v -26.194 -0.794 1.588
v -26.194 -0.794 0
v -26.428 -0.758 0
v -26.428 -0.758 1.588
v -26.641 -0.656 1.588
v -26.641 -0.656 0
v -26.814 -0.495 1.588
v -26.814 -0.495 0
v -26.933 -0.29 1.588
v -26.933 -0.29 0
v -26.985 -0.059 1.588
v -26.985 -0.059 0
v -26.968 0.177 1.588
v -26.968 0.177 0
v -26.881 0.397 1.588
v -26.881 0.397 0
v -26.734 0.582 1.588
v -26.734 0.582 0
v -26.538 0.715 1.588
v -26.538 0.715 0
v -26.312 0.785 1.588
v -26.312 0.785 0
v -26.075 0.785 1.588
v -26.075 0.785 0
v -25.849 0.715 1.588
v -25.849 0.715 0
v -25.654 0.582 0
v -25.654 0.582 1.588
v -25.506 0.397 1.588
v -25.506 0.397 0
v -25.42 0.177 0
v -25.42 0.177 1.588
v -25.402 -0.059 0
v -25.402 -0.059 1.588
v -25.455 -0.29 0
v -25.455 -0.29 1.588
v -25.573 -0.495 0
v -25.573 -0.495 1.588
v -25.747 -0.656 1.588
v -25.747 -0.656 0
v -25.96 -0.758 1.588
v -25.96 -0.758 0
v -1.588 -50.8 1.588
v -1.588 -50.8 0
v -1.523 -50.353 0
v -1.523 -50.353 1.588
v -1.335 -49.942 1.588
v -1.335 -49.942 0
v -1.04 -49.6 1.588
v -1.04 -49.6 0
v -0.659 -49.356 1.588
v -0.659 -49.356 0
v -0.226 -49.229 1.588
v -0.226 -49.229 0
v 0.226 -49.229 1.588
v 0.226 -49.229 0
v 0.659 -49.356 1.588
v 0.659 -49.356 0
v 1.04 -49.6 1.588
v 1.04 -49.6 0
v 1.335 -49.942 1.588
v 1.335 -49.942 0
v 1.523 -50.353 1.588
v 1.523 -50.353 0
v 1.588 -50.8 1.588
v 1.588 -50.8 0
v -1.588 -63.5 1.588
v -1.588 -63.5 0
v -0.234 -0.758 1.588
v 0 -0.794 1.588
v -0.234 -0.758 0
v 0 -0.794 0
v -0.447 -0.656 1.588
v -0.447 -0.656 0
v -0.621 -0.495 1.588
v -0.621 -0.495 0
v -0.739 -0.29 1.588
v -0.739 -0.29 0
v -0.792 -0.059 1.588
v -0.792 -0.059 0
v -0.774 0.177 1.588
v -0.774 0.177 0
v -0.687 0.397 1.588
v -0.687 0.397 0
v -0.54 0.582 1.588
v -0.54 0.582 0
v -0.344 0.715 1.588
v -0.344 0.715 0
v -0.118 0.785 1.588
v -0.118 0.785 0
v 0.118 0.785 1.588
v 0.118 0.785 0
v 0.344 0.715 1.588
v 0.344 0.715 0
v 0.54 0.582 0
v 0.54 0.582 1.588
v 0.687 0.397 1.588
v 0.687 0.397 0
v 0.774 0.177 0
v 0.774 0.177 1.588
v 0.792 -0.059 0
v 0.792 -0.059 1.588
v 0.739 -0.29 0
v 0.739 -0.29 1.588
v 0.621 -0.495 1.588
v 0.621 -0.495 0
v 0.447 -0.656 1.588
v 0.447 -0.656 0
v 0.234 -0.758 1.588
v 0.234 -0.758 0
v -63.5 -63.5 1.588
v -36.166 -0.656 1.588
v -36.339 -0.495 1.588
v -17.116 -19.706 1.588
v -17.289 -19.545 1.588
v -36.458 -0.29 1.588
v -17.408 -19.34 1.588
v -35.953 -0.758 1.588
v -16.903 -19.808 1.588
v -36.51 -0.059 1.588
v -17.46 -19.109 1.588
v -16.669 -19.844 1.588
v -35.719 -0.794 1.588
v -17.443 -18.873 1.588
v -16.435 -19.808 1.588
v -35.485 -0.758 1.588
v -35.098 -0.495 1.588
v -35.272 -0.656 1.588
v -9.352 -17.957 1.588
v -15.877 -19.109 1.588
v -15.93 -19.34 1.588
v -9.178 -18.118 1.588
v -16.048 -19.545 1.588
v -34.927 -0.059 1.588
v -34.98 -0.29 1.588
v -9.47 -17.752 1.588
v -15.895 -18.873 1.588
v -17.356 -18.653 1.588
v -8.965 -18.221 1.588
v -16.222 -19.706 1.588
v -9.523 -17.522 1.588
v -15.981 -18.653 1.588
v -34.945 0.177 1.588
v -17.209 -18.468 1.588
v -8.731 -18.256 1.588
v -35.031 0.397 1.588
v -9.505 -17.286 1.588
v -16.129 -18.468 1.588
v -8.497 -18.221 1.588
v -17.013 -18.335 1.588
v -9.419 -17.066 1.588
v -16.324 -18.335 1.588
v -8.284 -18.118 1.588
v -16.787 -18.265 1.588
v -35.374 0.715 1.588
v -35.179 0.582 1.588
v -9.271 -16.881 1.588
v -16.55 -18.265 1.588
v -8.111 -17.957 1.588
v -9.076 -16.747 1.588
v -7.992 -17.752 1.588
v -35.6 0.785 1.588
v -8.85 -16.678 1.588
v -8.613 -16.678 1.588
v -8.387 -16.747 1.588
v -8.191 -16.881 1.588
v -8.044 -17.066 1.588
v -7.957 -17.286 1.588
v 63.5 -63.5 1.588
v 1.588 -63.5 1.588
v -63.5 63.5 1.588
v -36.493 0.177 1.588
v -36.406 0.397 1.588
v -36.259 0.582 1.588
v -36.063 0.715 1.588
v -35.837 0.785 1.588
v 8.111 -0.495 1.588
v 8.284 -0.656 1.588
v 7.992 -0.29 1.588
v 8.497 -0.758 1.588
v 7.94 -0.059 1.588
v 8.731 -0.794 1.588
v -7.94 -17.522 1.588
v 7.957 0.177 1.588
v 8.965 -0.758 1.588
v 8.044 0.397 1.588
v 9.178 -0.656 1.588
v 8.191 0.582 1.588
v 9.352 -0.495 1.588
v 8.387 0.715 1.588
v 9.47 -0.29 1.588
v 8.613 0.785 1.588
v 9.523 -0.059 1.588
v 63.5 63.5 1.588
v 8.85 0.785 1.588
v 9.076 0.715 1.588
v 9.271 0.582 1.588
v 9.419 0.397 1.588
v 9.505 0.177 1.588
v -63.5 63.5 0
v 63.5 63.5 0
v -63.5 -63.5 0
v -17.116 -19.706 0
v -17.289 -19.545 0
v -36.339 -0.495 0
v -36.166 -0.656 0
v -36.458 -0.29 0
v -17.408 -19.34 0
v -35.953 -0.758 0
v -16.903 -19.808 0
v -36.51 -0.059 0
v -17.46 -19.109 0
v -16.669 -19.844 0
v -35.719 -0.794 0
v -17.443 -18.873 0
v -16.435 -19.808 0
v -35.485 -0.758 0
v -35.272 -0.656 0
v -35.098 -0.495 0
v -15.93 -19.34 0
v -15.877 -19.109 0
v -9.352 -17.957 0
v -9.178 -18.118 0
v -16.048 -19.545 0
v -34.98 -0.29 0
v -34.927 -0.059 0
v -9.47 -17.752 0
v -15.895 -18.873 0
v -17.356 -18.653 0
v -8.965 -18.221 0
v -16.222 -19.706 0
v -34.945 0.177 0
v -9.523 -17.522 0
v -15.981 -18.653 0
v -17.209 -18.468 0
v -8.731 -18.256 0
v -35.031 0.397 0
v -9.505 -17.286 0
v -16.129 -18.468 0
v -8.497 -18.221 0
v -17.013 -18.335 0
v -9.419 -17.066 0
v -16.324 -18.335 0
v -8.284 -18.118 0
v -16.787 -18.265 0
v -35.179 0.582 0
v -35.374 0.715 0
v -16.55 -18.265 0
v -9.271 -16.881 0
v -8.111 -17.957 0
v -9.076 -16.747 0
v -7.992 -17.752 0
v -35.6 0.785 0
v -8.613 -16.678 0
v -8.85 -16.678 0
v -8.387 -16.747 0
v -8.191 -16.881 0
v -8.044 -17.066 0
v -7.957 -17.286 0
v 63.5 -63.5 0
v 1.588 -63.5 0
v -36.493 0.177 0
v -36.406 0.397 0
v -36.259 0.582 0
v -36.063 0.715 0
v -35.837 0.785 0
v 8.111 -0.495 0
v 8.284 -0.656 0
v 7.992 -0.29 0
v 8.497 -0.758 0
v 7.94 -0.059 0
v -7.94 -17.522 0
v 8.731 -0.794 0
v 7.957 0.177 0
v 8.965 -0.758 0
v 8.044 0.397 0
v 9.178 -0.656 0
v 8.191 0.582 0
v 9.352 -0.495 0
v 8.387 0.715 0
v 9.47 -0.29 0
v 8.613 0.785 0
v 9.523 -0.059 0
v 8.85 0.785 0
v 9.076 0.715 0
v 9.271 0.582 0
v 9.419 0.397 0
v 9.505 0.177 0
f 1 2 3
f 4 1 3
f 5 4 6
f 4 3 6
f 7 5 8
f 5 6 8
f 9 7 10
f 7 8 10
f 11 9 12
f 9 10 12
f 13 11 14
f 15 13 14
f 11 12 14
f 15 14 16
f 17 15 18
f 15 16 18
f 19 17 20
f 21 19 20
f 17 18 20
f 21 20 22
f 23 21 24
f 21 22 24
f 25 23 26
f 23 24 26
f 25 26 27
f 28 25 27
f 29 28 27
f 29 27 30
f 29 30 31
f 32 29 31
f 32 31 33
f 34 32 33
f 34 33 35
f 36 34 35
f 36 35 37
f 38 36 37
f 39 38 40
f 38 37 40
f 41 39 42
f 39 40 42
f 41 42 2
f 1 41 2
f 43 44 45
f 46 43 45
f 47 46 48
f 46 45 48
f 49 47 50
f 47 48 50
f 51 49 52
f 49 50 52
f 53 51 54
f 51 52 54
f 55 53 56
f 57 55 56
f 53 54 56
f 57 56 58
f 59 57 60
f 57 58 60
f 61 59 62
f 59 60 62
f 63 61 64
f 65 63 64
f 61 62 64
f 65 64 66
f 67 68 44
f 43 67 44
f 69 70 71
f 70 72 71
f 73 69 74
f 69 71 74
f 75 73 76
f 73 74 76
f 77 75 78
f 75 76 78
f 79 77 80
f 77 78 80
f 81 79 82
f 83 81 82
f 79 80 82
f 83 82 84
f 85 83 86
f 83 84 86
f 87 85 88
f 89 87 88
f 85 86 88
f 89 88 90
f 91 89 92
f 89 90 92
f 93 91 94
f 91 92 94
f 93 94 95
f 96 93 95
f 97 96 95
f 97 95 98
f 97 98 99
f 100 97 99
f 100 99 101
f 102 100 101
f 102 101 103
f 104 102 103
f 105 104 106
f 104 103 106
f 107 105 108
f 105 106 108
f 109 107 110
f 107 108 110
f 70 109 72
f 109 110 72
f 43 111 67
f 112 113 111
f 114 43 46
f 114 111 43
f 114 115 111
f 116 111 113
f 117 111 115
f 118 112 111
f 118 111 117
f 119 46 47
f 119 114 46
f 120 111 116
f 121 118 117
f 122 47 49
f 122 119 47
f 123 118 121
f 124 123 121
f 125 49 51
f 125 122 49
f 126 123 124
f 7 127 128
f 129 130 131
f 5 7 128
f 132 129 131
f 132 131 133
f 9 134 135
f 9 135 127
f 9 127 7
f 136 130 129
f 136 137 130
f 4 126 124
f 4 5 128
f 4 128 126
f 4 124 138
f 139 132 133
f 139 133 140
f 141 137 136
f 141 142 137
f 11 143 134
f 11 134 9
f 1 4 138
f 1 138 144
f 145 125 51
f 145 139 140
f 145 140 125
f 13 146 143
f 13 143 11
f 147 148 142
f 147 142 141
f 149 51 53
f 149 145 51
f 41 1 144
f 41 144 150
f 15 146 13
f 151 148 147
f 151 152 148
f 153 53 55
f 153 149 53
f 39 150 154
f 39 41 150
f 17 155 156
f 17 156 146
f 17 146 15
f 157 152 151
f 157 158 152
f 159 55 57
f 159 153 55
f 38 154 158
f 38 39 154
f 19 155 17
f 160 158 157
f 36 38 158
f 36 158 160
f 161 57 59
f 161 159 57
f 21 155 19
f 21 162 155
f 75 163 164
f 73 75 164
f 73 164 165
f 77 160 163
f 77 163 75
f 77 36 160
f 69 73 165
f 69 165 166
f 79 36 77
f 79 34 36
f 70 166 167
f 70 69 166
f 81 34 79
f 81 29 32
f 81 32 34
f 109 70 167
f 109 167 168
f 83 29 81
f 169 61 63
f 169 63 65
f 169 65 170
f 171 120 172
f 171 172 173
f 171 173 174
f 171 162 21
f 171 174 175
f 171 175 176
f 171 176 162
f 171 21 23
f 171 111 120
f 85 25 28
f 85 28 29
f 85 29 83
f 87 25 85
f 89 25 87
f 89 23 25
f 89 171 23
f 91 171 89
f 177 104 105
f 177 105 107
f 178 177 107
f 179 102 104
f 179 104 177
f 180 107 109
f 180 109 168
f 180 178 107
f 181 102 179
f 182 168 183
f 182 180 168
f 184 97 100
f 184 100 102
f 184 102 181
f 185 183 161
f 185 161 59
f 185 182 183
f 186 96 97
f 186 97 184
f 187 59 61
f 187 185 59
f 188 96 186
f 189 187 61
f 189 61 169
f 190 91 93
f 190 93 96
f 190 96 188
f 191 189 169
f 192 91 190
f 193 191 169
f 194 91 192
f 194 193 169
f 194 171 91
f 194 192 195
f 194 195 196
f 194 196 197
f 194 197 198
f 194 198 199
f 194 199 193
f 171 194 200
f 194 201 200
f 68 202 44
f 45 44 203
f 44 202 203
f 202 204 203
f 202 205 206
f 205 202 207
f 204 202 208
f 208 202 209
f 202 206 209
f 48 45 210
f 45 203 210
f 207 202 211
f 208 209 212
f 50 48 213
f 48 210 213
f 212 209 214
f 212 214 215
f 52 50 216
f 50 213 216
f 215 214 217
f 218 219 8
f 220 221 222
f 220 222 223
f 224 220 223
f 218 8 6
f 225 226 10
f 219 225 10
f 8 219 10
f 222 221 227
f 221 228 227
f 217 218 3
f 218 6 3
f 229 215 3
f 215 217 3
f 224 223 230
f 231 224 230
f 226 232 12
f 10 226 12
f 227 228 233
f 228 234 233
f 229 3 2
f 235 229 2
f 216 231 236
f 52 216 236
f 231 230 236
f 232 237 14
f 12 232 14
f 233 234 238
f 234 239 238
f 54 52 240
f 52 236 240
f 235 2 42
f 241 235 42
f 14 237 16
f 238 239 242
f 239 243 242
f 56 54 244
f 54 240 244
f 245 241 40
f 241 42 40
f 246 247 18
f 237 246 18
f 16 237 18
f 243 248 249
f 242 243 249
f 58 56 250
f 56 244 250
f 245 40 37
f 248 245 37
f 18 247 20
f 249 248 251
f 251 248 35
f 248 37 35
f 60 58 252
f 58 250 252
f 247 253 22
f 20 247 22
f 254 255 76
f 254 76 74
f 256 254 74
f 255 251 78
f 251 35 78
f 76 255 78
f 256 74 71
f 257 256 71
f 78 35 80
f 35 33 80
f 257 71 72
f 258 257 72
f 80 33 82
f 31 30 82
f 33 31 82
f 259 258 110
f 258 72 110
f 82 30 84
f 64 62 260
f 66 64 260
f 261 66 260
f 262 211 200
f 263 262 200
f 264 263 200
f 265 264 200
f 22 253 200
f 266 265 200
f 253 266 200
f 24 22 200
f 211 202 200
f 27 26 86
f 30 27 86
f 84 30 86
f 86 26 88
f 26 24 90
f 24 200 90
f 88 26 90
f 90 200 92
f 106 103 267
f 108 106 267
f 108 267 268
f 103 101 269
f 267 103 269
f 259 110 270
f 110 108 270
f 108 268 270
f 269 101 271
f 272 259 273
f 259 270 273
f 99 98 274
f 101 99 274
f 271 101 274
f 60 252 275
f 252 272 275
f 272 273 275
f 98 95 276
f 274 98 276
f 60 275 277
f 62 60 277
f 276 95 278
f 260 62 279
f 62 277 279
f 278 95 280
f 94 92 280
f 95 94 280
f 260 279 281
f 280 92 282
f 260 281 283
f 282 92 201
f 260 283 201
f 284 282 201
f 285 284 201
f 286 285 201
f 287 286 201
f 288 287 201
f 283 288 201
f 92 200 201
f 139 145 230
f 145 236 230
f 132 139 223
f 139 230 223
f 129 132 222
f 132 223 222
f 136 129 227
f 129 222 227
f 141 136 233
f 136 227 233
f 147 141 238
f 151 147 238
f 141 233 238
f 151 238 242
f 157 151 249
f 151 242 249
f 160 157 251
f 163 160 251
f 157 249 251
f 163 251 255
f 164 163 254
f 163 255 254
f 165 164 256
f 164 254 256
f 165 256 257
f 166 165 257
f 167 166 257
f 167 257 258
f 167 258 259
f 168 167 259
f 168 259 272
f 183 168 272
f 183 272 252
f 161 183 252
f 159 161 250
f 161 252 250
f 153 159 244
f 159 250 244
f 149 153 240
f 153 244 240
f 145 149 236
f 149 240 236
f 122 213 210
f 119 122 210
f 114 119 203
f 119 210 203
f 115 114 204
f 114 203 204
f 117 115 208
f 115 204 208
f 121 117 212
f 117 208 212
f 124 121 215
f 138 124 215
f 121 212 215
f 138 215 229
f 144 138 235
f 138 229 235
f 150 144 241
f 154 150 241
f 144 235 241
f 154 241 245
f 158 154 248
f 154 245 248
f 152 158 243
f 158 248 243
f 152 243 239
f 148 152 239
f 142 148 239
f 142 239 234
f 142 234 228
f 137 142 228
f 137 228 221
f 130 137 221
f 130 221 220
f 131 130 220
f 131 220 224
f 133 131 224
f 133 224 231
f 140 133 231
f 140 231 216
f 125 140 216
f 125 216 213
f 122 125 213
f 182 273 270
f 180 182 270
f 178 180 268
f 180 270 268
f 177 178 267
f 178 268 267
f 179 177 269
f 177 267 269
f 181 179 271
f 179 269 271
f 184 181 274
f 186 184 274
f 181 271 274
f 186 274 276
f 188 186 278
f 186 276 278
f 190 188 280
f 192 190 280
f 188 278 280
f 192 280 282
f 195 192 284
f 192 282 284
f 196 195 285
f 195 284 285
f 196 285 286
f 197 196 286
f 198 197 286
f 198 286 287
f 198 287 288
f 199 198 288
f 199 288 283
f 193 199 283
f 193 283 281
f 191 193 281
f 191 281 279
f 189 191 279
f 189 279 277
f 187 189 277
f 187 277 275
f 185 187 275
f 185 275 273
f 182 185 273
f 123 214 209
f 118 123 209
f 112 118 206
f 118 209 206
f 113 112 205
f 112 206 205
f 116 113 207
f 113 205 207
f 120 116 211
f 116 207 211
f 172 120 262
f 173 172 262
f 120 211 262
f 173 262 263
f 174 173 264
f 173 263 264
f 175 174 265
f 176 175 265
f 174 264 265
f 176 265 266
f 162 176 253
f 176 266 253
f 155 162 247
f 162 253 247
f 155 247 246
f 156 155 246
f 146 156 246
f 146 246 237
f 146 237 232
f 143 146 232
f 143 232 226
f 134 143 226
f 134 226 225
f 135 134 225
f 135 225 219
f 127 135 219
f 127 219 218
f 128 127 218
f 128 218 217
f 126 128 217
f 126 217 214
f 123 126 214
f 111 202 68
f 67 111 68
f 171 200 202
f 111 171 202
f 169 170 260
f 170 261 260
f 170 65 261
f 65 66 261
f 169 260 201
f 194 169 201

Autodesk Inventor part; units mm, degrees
ref_plane "YZ Plane" through (0, 0, 0) normal (1, 0, 0) x (0, 1, 0)
ref_plane "XZ Plane" through (0, 0, 0) normal (0, 1, 0) x (-1, 0, 0)
ref_plane "XY Plane" through (0, 0, 0) normal (0, 0, 1) x (1, 0, 0)
sketch "Sketch1" plane through (0, 0, 0) normal (0, 0, 1) x (1, 0, 0)
  line L0 (-63.5, -63.5) -> (63.5, -63.5)
  line L1 (63.5, -63.5) -> (63.5, 63.5)
  line L2 (63.5, 63.5) -> (-63.5, 63.5)
  line L3 (-63.5, 63.5) -> (-63.5, -63.5)
  line L4 (-63.5, -63.5) -> (63.5, 63.5) construction
  line L5 (63.5, -63.5) -> (-63.5, 63.5) construction
  point P0 (0, 0)
  dimension "d0" = 127
  dimension "d1" = 127
extrude "Extrusion1" add sketch "Sketch1" along normal blind 1.5875
sketch "Sketch2" plane through (0, 0, 0) normal (0, 0, -1) x (-1, 0, 0)
  line L0 (0, -76.2) -> (0, -50.8) construction
  line L1 (63.5, -63.5) -> (-63.5, -63.5) projected
  line L2 (1.5875, -76.2) -> (1.5875, -50.8)
  line L3 (-1.5875, -50.8) -> (-1.5875, -76.2)
  arc A0 (-1.5875, -76.2) -> (1.5875, -76.2) centre (0, -76.2) ccw
  arc A1 (1.5875, -50.8) -> (-1.5875, -50.8) centre (0, -50.8) ccw
  point P0 (0, 0)
  point P1 (0, -63.5)
  dimension "d4" = 12.7
  dimension "d5" = 3.175
extrude "Extrusion2" cut sketch "Sketch2" against normal blind 1.5875
sketch "Sketch3" plane through (0, 0, 1.5875) normal (0, 0, 1) x (1, 0, 0)
  line L0 (-35.7187, 0) -> (2.3813, 0)
  line L1 (-16.6687, 0) -> (-16.6687, -19.05)
  line L2 (-63.5, 63.5) -> (-63.5, -63.5) projected
  line L3 (-26.1937, 0) -> (8.7313, 0)
  line L4 (-8.7312, 0) -> (-8.7312, -17.4625)
  point P0 (0, 0)
  point P1 (0, 0)
  dimension "d8" = 38.1
  dimension "d9" = 19.05
  dimension "d10" = 19.05
  dimension "d11" = 27.7812
  dimension "d12" = 34.925
  dimension "d13" = 9.525
  dimension "d14" = 17.4625
  dimension "d15" = 17.4625
hole "Hole1" at (-35.7187, 0, 1.5875) at (-16.6687, -19.05, 1.5875) at (-26.1937, 0, 1.5875) at (-8.7312, -17.4625, 1.5875) at (8.7313, 0, 1.5875) at (0, 0, 1.5875) direction (0, 0, -1) diameter 1.5875 depth 25.4 tip angle 118
properties part number "fs_roughmask"
